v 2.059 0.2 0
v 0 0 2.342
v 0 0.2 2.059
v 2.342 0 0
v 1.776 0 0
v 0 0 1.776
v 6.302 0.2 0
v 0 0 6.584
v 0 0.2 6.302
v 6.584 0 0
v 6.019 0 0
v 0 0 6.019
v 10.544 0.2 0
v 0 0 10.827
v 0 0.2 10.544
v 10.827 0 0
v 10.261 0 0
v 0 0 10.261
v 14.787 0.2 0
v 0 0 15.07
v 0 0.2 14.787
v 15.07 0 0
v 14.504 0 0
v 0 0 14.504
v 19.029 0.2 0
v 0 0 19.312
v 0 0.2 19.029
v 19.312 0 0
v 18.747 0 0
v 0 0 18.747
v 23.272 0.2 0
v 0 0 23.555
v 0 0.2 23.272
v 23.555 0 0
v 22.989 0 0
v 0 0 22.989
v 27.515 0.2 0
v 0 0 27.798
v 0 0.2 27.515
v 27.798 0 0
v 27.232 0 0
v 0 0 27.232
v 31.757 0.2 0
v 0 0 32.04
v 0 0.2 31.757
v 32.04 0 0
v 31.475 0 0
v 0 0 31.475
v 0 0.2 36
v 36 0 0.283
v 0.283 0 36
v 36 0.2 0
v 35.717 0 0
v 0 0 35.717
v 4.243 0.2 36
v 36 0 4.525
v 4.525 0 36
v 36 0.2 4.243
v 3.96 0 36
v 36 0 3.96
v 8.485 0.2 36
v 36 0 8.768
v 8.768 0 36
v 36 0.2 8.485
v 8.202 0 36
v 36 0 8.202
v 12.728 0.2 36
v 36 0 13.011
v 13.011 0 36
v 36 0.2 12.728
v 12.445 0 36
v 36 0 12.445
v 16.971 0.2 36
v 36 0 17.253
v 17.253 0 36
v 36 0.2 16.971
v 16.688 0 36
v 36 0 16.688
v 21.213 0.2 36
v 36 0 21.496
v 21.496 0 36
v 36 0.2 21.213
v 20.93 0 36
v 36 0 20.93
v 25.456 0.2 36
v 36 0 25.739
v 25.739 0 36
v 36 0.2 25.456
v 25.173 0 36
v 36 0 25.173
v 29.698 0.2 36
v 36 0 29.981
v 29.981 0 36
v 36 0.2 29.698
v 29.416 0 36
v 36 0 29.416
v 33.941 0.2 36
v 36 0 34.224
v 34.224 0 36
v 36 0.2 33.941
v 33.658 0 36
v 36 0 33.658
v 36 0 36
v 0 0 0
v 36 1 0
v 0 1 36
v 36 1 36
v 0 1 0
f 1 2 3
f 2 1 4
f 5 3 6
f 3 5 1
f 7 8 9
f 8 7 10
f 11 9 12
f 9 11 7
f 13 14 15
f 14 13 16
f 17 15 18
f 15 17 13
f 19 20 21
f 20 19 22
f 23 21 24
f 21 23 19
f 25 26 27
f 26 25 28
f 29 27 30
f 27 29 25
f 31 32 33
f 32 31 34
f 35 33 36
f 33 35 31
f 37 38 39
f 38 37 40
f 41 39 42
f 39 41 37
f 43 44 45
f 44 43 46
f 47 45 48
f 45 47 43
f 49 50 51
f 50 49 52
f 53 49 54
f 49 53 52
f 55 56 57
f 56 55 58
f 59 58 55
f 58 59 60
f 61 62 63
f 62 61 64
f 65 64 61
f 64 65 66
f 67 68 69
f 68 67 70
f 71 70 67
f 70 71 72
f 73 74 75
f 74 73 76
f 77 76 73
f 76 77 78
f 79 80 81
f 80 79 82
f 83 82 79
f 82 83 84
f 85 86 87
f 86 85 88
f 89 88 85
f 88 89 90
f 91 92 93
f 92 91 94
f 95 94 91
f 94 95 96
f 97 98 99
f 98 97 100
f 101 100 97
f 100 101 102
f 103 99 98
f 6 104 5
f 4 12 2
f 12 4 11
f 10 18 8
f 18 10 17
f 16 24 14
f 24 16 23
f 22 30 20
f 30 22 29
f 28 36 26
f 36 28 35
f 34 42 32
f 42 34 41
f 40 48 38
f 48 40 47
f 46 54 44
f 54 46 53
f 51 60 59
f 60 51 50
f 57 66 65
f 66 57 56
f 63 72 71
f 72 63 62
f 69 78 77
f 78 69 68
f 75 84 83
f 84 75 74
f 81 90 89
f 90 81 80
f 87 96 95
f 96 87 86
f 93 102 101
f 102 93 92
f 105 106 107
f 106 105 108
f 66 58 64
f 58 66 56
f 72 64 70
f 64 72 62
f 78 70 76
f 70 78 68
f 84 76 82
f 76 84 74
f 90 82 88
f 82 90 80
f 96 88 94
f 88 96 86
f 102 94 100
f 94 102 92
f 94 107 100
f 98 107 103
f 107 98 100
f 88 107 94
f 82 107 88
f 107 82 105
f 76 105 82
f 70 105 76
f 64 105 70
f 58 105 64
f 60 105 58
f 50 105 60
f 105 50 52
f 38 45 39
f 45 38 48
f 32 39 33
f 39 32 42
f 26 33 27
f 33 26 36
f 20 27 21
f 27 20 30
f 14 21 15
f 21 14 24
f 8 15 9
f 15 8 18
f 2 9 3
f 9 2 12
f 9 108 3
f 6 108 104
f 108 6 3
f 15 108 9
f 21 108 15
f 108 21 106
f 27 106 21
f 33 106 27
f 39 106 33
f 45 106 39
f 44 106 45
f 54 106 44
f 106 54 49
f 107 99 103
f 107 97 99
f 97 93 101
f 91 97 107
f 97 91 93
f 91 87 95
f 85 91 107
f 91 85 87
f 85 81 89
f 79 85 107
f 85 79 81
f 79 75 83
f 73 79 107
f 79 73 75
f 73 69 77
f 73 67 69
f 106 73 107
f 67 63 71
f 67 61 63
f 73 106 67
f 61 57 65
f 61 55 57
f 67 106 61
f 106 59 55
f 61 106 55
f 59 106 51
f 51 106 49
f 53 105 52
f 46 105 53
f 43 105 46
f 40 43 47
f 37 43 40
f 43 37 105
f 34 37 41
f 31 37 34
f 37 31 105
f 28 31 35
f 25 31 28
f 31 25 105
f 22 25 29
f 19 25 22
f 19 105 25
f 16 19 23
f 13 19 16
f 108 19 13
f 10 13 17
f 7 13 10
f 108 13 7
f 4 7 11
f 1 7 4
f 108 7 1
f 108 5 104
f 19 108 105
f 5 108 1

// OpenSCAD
// file: siding.scad
/* clapboard - makes clapboard walls

Usage:
	use <path/to/siding.scad>
	...
	clapboard(
		width=10, //how wide, in units
		height=5, //how tall, in boards
		boardwidth=1, //individual board width
		boardthickness=0.1, //individual board thickness
		pitch=5, //angle of board pitch, in degrees
	);
	
The numbers given above are the defaults if you just do
clapboard();  define them to suit your scale and clapboard style.

This module just presents the clapboard planks; to make a 
complete wall with a smooth back, union it with a cube of 
the width, height, and boardwidth of the clapboard pattern.
The example use code at the bottom of this file demonstrates this;
uncomment the cube() line by removing the two forward slashes 
(//).
	
To use in other programs, create your clapboard pattern in the 
required dimensions and export as a .STL file.  Note that
this will lose the color definition.

*/

module clapboard(width=10, height=5, boardwidth=1, boardthickness=0.1, pitch=5)
{
	translate([0,0,boardthickness]) //move the whole thing up above Z=0
		for (board = [0:1:height-1]) // number of boards, given by height
			translate ([0,board*boardwidth,0]) rotate([-pitch,0,0]) cube ([width, boardwidth, boardthickness]);
	
}

/* planksiding_old - makes plank walls

Usage:
	use <path/to/siding.scad>
	...
	planksiding(
		width=10, //how wide, in units
		height=5, //how tall, in boards
		boardwidth=1, //individual board width
		boardthickness=0.1, //individual board thickness
		notch=0.4,  //depth of the notch in the board interfaces,
					// 0=no notch, 1=notch is full depth of board.
	);
	
The numbers given above are the defaults if you just do
planksiding();  define them to suit your scale and clapboard 
style.
	
To use in other programs, create your planksiding in the 
required dimensions and export as a .STL file.  Note that
this will lose the color definition.

*/

module planksiding_old(width=10, height=5, boardwidth=1, boardthickness=0.1, notch=0.4)
{	
	difference() {
		cube([width, height*boardwidth, boardthickness]);
		union() {
			for (board = [0:1:height])
				translate ([-width/2,board*boardwidth,boardthickness-(boardthickness * notch)]) 
					rotate([45,0,0]) cube (size=[width*2, boardthickness*3, boardthickness*3]);
		}
	}
}


/* planksiding - makes plank walls

Usage:
	use <path/to/siding.scad>
	...
	planksiding(
		width=10, //how wide, in units
		height=5, //how tall, in units
		boardwidth=4, //individual board width
		boardthickness=1, //individual board thickness
		notch=0.3,  //depth of the notch in the board interfaces,
					// 0=no notch, 1=notch is full depth of board.
	);
	
The numbers given above are the defaults if you just do
planksiding();  define them to suit your scale and clapboard 
style.
	
To use in other programs, create your planksiding in the 
required dimensions and export as a .STL file.

*/


module planksiding(width=10*12, height=5*12, boardwidth=4, boardthickness=1, notch=0.3)
{	
	difference() {
		cube([width, height, boardthickness]);
		union() {
			for (board = [0:1:height/boardwidth])
				translate ([-width/2,board*boardwidth,boardthickness-(boardthickness * notch)]) 
					rotate([45,0,0]) cube (size=[width*2, boardthickness*3, boardthickness*3]);
		}
	}
}

//clapboard();
planksiding();
// main file
use <siding.scad>

module wainscotting(width=5*12, height=3*12, boardwidth=3, boardthickness=2, rotation=45) {
		o = width > height ? width*2 : height*2;
		rotate([90,0,0])
		translate([width/2,height/2,-boardthickness])
		intersection() {
			rotate([0,0,rotation])
				translate([-o/2, -o/2,0]) 
					planksiding(width=o, height=o, boardwidth=boardwidth, boardthickness=boardthickness, notch=0.2);
			translate([-width/2,-height/2,-boardthickness]) 
				cube([width, height, boardthickness*2]);
		}
}

//wainscotting();
wallthick=6;
//wainscotting(width=5*12, height=3*12, boardwidth=3, boardthickness=2, rotation=45);
wainscotting(width=2*12+wallthick*2, height=3*12, boardwidth=3, boardthickness=1,  rotation=-45);
